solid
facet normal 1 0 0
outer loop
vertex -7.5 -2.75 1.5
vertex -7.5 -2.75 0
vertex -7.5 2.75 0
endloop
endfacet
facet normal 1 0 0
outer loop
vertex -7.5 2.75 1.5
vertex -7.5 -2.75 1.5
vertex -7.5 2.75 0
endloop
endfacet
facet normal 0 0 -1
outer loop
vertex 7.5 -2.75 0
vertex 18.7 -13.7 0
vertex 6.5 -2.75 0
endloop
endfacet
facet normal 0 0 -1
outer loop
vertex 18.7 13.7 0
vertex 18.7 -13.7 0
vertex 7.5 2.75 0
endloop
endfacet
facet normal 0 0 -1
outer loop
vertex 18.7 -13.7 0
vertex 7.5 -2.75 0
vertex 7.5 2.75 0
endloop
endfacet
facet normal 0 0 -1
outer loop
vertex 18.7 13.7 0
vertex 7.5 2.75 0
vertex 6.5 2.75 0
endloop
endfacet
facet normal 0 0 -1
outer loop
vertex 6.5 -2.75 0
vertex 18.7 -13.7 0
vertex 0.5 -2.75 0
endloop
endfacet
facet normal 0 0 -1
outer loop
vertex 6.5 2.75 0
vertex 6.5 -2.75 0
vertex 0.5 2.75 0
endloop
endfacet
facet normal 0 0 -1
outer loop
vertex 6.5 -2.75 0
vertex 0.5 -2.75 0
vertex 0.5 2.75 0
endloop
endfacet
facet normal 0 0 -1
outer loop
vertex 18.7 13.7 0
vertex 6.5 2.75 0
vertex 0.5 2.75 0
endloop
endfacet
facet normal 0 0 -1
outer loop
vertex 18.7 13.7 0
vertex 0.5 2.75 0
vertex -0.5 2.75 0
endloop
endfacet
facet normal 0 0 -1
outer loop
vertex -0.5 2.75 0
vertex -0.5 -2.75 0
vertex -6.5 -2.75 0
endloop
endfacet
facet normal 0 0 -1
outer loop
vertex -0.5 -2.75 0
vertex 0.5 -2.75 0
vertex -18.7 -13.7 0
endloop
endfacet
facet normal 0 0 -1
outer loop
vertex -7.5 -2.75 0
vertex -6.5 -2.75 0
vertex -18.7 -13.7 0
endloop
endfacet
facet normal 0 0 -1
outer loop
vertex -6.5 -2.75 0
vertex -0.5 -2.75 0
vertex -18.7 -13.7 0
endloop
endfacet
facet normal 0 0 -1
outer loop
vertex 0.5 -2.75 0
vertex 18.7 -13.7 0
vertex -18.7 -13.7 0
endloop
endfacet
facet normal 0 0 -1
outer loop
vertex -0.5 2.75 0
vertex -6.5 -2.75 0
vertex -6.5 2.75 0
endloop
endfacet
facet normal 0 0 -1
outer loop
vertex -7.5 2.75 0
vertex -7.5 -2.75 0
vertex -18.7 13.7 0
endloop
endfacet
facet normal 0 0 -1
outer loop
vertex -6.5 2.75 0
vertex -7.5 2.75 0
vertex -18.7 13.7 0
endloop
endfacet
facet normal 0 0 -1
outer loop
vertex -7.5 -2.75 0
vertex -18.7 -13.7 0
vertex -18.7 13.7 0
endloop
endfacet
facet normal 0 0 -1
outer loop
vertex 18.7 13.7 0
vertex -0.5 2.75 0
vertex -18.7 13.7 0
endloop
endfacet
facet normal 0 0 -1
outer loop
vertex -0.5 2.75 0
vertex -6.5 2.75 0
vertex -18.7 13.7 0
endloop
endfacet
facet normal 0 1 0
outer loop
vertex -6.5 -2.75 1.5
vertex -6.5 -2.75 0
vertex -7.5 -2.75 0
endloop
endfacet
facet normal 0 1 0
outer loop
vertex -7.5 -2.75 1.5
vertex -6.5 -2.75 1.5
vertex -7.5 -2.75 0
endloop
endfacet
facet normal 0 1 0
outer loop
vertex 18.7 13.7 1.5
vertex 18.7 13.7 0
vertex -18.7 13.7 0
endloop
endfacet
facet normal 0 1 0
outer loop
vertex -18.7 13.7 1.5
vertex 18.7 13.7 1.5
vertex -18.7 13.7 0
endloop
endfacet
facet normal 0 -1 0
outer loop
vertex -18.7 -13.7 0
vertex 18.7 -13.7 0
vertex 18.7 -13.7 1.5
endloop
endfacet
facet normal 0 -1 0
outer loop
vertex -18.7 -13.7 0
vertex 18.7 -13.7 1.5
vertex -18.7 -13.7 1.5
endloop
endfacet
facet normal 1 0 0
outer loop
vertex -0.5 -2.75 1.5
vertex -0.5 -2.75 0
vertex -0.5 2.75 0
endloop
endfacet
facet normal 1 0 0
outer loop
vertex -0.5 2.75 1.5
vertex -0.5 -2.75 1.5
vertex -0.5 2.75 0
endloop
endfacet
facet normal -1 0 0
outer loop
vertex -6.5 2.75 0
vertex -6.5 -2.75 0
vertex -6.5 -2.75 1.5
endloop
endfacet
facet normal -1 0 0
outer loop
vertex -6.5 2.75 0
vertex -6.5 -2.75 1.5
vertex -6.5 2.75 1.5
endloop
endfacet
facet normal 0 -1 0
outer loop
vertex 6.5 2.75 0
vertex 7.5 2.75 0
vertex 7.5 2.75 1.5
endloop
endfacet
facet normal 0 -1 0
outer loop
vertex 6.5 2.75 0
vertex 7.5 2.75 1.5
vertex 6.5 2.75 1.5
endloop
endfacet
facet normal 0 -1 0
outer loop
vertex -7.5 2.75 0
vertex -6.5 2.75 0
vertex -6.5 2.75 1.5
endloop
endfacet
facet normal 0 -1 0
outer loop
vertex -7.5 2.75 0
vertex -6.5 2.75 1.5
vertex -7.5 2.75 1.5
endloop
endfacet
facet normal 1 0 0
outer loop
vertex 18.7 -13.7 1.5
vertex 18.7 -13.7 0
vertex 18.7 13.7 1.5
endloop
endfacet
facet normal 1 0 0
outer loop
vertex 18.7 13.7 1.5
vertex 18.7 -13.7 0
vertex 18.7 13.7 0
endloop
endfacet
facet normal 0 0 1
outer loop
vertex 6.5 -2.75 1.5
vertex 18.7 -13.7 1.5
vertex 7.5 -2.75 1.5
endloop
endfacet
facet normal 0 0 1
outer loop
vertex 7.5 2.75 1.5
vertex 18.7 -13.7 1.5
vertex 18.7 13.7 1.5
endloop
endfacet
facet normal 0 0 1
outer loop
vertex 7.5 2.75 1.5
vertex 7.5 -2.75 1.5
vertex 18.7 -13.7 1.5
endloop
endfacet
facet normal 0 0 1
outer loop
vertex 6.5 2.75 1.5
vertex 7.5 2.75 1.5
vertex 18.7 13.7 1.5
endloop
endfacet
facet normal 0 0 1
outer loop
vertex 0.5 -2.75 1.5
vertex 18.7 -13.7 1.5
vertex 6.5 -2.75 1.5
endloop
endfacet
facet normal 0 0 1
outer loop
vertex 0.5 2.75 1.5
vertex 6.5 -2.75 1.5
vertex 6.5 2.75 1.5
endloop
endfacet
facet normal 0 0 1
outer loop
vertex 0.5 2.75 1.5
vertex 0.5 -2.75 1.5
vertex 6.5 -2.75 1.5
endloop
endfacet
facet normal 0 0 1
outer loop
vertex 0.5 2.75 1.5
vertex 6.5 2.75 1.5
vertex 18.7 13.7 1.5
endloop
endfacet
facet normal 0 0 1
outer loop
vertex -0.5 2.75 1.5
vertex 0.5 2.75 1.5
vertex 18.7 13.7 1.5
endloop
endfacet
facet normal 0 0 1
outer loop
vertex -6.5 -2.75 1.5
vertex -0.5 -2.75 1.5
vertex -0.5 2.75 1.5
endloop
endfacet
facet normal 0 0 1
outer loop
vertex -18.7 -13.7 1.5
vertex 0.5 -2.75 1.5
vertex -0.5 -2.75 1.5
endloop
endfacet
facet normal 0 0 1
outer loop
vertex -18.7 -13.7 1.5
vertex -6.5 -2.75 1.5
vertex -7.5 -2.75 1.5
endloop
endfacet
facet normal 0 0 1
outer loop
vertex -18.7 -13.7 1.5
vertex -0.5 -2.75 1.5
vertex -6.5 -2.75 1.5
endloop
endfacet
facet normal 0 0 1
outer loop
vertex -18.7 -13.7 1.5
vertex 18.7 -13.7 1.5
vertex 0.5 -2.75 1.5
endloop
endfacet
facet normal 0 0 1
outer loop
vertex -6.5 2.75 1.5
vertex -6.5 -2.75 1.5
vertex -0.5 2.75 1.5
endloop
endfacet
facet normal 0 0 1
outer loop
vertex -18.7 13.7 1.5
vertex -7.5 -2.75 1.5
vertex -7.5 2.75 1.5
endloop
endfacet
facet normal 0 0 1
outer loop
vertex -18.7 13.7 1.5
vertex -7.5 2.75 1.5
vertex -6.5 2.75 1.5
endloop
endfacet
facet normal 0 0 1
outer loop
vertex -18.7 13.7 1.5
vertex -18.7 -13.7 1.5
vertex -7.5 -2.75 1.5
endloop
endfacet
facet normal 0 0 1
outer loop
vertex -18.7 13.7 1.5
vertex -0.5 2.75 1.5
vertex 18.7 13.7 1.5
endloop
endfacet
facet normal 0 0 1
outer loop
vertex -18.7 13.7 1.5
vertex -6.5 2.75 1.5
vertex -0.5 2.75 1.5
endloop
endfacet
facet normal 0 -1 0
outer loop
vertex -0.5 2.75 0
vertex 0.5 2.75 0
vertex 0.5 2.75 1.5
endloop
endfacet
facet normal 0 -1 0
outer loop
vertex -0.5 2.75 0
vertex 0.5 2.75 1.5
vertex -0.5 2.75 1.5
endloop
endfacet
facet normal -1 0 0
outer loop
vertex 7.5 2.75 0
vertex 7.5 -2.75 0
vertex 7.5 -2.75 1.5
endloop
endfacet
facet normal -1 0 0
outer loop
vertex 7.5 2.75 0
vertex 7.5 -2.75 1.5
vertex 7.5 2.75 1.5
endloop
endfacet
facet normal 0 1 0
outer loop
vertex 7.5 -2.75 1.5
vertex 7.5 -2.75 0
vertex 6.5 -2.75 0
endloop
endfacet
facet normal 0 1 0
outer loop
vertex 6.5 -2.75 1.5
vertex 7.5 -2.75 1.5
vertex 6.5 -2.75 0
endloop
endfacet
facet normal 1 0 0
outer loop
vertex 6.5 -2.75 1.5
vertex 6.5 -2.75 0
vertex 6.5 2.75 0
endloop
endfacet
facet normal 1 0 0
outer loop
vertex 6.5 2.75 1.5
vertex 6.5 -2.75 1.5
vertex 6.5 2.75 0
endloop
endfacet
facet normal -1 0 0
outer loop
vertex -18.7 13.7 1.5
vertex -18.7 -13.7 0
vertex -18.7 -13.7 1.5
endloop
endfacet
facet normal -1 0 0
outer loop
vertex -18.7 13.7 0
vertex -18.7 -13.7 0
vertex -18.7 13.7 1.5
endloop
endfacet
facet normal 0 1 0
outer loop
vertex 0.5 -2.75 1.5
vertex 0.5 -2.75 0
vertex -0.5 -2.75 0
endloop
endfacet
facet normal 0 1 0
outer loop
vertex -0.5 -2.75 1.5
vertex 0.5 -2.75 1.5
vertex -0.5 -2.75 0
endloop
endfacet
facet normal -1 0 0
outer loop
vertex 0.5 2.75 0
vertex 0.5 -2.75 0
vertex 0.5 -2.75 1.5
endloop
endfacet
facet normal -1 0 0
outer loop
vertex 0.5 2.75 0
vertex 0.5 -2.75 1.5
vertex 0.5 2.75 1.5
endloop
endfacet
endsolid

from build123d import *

# Parameters (mm, degrees)
SKETCH1_W           = 27.4
SKETCH1_H           = 37.4
SKETCH1_W_2         = 5.5
SKETCH1_H_2         = 1
BOSS_EXTRUDE1_DEPTH = 1.5


with BuildPart() as part:
    # Sketch1 → Boss-Extrude1 (new body)
    with BuildSketch(Plane(origin=(0, 0, 0), x_dir=(0, 1, 0), z_dir=(0, 0, 1))):
        Rectangle(SKETCH1_W, SKETCH1_H)
        Rectangle(SKETCH1_W_2, SKETCH1_H_2, mode=Mode.SUBTRACT)
        with Locations((0, 7)):
            Rectangle(SKETCH1_W_2, SKETCH1_H_2, mode=Mode.SUBTRACT)
        with Locations((0, -7)):
            Rectangle(SKETCH1_W_2, SKETCH1_H_2, mode=Mode.SUBTRACT)
    extrude(amount=BOSS_EXTRUDE1_DEPTH)


solid = part.part
